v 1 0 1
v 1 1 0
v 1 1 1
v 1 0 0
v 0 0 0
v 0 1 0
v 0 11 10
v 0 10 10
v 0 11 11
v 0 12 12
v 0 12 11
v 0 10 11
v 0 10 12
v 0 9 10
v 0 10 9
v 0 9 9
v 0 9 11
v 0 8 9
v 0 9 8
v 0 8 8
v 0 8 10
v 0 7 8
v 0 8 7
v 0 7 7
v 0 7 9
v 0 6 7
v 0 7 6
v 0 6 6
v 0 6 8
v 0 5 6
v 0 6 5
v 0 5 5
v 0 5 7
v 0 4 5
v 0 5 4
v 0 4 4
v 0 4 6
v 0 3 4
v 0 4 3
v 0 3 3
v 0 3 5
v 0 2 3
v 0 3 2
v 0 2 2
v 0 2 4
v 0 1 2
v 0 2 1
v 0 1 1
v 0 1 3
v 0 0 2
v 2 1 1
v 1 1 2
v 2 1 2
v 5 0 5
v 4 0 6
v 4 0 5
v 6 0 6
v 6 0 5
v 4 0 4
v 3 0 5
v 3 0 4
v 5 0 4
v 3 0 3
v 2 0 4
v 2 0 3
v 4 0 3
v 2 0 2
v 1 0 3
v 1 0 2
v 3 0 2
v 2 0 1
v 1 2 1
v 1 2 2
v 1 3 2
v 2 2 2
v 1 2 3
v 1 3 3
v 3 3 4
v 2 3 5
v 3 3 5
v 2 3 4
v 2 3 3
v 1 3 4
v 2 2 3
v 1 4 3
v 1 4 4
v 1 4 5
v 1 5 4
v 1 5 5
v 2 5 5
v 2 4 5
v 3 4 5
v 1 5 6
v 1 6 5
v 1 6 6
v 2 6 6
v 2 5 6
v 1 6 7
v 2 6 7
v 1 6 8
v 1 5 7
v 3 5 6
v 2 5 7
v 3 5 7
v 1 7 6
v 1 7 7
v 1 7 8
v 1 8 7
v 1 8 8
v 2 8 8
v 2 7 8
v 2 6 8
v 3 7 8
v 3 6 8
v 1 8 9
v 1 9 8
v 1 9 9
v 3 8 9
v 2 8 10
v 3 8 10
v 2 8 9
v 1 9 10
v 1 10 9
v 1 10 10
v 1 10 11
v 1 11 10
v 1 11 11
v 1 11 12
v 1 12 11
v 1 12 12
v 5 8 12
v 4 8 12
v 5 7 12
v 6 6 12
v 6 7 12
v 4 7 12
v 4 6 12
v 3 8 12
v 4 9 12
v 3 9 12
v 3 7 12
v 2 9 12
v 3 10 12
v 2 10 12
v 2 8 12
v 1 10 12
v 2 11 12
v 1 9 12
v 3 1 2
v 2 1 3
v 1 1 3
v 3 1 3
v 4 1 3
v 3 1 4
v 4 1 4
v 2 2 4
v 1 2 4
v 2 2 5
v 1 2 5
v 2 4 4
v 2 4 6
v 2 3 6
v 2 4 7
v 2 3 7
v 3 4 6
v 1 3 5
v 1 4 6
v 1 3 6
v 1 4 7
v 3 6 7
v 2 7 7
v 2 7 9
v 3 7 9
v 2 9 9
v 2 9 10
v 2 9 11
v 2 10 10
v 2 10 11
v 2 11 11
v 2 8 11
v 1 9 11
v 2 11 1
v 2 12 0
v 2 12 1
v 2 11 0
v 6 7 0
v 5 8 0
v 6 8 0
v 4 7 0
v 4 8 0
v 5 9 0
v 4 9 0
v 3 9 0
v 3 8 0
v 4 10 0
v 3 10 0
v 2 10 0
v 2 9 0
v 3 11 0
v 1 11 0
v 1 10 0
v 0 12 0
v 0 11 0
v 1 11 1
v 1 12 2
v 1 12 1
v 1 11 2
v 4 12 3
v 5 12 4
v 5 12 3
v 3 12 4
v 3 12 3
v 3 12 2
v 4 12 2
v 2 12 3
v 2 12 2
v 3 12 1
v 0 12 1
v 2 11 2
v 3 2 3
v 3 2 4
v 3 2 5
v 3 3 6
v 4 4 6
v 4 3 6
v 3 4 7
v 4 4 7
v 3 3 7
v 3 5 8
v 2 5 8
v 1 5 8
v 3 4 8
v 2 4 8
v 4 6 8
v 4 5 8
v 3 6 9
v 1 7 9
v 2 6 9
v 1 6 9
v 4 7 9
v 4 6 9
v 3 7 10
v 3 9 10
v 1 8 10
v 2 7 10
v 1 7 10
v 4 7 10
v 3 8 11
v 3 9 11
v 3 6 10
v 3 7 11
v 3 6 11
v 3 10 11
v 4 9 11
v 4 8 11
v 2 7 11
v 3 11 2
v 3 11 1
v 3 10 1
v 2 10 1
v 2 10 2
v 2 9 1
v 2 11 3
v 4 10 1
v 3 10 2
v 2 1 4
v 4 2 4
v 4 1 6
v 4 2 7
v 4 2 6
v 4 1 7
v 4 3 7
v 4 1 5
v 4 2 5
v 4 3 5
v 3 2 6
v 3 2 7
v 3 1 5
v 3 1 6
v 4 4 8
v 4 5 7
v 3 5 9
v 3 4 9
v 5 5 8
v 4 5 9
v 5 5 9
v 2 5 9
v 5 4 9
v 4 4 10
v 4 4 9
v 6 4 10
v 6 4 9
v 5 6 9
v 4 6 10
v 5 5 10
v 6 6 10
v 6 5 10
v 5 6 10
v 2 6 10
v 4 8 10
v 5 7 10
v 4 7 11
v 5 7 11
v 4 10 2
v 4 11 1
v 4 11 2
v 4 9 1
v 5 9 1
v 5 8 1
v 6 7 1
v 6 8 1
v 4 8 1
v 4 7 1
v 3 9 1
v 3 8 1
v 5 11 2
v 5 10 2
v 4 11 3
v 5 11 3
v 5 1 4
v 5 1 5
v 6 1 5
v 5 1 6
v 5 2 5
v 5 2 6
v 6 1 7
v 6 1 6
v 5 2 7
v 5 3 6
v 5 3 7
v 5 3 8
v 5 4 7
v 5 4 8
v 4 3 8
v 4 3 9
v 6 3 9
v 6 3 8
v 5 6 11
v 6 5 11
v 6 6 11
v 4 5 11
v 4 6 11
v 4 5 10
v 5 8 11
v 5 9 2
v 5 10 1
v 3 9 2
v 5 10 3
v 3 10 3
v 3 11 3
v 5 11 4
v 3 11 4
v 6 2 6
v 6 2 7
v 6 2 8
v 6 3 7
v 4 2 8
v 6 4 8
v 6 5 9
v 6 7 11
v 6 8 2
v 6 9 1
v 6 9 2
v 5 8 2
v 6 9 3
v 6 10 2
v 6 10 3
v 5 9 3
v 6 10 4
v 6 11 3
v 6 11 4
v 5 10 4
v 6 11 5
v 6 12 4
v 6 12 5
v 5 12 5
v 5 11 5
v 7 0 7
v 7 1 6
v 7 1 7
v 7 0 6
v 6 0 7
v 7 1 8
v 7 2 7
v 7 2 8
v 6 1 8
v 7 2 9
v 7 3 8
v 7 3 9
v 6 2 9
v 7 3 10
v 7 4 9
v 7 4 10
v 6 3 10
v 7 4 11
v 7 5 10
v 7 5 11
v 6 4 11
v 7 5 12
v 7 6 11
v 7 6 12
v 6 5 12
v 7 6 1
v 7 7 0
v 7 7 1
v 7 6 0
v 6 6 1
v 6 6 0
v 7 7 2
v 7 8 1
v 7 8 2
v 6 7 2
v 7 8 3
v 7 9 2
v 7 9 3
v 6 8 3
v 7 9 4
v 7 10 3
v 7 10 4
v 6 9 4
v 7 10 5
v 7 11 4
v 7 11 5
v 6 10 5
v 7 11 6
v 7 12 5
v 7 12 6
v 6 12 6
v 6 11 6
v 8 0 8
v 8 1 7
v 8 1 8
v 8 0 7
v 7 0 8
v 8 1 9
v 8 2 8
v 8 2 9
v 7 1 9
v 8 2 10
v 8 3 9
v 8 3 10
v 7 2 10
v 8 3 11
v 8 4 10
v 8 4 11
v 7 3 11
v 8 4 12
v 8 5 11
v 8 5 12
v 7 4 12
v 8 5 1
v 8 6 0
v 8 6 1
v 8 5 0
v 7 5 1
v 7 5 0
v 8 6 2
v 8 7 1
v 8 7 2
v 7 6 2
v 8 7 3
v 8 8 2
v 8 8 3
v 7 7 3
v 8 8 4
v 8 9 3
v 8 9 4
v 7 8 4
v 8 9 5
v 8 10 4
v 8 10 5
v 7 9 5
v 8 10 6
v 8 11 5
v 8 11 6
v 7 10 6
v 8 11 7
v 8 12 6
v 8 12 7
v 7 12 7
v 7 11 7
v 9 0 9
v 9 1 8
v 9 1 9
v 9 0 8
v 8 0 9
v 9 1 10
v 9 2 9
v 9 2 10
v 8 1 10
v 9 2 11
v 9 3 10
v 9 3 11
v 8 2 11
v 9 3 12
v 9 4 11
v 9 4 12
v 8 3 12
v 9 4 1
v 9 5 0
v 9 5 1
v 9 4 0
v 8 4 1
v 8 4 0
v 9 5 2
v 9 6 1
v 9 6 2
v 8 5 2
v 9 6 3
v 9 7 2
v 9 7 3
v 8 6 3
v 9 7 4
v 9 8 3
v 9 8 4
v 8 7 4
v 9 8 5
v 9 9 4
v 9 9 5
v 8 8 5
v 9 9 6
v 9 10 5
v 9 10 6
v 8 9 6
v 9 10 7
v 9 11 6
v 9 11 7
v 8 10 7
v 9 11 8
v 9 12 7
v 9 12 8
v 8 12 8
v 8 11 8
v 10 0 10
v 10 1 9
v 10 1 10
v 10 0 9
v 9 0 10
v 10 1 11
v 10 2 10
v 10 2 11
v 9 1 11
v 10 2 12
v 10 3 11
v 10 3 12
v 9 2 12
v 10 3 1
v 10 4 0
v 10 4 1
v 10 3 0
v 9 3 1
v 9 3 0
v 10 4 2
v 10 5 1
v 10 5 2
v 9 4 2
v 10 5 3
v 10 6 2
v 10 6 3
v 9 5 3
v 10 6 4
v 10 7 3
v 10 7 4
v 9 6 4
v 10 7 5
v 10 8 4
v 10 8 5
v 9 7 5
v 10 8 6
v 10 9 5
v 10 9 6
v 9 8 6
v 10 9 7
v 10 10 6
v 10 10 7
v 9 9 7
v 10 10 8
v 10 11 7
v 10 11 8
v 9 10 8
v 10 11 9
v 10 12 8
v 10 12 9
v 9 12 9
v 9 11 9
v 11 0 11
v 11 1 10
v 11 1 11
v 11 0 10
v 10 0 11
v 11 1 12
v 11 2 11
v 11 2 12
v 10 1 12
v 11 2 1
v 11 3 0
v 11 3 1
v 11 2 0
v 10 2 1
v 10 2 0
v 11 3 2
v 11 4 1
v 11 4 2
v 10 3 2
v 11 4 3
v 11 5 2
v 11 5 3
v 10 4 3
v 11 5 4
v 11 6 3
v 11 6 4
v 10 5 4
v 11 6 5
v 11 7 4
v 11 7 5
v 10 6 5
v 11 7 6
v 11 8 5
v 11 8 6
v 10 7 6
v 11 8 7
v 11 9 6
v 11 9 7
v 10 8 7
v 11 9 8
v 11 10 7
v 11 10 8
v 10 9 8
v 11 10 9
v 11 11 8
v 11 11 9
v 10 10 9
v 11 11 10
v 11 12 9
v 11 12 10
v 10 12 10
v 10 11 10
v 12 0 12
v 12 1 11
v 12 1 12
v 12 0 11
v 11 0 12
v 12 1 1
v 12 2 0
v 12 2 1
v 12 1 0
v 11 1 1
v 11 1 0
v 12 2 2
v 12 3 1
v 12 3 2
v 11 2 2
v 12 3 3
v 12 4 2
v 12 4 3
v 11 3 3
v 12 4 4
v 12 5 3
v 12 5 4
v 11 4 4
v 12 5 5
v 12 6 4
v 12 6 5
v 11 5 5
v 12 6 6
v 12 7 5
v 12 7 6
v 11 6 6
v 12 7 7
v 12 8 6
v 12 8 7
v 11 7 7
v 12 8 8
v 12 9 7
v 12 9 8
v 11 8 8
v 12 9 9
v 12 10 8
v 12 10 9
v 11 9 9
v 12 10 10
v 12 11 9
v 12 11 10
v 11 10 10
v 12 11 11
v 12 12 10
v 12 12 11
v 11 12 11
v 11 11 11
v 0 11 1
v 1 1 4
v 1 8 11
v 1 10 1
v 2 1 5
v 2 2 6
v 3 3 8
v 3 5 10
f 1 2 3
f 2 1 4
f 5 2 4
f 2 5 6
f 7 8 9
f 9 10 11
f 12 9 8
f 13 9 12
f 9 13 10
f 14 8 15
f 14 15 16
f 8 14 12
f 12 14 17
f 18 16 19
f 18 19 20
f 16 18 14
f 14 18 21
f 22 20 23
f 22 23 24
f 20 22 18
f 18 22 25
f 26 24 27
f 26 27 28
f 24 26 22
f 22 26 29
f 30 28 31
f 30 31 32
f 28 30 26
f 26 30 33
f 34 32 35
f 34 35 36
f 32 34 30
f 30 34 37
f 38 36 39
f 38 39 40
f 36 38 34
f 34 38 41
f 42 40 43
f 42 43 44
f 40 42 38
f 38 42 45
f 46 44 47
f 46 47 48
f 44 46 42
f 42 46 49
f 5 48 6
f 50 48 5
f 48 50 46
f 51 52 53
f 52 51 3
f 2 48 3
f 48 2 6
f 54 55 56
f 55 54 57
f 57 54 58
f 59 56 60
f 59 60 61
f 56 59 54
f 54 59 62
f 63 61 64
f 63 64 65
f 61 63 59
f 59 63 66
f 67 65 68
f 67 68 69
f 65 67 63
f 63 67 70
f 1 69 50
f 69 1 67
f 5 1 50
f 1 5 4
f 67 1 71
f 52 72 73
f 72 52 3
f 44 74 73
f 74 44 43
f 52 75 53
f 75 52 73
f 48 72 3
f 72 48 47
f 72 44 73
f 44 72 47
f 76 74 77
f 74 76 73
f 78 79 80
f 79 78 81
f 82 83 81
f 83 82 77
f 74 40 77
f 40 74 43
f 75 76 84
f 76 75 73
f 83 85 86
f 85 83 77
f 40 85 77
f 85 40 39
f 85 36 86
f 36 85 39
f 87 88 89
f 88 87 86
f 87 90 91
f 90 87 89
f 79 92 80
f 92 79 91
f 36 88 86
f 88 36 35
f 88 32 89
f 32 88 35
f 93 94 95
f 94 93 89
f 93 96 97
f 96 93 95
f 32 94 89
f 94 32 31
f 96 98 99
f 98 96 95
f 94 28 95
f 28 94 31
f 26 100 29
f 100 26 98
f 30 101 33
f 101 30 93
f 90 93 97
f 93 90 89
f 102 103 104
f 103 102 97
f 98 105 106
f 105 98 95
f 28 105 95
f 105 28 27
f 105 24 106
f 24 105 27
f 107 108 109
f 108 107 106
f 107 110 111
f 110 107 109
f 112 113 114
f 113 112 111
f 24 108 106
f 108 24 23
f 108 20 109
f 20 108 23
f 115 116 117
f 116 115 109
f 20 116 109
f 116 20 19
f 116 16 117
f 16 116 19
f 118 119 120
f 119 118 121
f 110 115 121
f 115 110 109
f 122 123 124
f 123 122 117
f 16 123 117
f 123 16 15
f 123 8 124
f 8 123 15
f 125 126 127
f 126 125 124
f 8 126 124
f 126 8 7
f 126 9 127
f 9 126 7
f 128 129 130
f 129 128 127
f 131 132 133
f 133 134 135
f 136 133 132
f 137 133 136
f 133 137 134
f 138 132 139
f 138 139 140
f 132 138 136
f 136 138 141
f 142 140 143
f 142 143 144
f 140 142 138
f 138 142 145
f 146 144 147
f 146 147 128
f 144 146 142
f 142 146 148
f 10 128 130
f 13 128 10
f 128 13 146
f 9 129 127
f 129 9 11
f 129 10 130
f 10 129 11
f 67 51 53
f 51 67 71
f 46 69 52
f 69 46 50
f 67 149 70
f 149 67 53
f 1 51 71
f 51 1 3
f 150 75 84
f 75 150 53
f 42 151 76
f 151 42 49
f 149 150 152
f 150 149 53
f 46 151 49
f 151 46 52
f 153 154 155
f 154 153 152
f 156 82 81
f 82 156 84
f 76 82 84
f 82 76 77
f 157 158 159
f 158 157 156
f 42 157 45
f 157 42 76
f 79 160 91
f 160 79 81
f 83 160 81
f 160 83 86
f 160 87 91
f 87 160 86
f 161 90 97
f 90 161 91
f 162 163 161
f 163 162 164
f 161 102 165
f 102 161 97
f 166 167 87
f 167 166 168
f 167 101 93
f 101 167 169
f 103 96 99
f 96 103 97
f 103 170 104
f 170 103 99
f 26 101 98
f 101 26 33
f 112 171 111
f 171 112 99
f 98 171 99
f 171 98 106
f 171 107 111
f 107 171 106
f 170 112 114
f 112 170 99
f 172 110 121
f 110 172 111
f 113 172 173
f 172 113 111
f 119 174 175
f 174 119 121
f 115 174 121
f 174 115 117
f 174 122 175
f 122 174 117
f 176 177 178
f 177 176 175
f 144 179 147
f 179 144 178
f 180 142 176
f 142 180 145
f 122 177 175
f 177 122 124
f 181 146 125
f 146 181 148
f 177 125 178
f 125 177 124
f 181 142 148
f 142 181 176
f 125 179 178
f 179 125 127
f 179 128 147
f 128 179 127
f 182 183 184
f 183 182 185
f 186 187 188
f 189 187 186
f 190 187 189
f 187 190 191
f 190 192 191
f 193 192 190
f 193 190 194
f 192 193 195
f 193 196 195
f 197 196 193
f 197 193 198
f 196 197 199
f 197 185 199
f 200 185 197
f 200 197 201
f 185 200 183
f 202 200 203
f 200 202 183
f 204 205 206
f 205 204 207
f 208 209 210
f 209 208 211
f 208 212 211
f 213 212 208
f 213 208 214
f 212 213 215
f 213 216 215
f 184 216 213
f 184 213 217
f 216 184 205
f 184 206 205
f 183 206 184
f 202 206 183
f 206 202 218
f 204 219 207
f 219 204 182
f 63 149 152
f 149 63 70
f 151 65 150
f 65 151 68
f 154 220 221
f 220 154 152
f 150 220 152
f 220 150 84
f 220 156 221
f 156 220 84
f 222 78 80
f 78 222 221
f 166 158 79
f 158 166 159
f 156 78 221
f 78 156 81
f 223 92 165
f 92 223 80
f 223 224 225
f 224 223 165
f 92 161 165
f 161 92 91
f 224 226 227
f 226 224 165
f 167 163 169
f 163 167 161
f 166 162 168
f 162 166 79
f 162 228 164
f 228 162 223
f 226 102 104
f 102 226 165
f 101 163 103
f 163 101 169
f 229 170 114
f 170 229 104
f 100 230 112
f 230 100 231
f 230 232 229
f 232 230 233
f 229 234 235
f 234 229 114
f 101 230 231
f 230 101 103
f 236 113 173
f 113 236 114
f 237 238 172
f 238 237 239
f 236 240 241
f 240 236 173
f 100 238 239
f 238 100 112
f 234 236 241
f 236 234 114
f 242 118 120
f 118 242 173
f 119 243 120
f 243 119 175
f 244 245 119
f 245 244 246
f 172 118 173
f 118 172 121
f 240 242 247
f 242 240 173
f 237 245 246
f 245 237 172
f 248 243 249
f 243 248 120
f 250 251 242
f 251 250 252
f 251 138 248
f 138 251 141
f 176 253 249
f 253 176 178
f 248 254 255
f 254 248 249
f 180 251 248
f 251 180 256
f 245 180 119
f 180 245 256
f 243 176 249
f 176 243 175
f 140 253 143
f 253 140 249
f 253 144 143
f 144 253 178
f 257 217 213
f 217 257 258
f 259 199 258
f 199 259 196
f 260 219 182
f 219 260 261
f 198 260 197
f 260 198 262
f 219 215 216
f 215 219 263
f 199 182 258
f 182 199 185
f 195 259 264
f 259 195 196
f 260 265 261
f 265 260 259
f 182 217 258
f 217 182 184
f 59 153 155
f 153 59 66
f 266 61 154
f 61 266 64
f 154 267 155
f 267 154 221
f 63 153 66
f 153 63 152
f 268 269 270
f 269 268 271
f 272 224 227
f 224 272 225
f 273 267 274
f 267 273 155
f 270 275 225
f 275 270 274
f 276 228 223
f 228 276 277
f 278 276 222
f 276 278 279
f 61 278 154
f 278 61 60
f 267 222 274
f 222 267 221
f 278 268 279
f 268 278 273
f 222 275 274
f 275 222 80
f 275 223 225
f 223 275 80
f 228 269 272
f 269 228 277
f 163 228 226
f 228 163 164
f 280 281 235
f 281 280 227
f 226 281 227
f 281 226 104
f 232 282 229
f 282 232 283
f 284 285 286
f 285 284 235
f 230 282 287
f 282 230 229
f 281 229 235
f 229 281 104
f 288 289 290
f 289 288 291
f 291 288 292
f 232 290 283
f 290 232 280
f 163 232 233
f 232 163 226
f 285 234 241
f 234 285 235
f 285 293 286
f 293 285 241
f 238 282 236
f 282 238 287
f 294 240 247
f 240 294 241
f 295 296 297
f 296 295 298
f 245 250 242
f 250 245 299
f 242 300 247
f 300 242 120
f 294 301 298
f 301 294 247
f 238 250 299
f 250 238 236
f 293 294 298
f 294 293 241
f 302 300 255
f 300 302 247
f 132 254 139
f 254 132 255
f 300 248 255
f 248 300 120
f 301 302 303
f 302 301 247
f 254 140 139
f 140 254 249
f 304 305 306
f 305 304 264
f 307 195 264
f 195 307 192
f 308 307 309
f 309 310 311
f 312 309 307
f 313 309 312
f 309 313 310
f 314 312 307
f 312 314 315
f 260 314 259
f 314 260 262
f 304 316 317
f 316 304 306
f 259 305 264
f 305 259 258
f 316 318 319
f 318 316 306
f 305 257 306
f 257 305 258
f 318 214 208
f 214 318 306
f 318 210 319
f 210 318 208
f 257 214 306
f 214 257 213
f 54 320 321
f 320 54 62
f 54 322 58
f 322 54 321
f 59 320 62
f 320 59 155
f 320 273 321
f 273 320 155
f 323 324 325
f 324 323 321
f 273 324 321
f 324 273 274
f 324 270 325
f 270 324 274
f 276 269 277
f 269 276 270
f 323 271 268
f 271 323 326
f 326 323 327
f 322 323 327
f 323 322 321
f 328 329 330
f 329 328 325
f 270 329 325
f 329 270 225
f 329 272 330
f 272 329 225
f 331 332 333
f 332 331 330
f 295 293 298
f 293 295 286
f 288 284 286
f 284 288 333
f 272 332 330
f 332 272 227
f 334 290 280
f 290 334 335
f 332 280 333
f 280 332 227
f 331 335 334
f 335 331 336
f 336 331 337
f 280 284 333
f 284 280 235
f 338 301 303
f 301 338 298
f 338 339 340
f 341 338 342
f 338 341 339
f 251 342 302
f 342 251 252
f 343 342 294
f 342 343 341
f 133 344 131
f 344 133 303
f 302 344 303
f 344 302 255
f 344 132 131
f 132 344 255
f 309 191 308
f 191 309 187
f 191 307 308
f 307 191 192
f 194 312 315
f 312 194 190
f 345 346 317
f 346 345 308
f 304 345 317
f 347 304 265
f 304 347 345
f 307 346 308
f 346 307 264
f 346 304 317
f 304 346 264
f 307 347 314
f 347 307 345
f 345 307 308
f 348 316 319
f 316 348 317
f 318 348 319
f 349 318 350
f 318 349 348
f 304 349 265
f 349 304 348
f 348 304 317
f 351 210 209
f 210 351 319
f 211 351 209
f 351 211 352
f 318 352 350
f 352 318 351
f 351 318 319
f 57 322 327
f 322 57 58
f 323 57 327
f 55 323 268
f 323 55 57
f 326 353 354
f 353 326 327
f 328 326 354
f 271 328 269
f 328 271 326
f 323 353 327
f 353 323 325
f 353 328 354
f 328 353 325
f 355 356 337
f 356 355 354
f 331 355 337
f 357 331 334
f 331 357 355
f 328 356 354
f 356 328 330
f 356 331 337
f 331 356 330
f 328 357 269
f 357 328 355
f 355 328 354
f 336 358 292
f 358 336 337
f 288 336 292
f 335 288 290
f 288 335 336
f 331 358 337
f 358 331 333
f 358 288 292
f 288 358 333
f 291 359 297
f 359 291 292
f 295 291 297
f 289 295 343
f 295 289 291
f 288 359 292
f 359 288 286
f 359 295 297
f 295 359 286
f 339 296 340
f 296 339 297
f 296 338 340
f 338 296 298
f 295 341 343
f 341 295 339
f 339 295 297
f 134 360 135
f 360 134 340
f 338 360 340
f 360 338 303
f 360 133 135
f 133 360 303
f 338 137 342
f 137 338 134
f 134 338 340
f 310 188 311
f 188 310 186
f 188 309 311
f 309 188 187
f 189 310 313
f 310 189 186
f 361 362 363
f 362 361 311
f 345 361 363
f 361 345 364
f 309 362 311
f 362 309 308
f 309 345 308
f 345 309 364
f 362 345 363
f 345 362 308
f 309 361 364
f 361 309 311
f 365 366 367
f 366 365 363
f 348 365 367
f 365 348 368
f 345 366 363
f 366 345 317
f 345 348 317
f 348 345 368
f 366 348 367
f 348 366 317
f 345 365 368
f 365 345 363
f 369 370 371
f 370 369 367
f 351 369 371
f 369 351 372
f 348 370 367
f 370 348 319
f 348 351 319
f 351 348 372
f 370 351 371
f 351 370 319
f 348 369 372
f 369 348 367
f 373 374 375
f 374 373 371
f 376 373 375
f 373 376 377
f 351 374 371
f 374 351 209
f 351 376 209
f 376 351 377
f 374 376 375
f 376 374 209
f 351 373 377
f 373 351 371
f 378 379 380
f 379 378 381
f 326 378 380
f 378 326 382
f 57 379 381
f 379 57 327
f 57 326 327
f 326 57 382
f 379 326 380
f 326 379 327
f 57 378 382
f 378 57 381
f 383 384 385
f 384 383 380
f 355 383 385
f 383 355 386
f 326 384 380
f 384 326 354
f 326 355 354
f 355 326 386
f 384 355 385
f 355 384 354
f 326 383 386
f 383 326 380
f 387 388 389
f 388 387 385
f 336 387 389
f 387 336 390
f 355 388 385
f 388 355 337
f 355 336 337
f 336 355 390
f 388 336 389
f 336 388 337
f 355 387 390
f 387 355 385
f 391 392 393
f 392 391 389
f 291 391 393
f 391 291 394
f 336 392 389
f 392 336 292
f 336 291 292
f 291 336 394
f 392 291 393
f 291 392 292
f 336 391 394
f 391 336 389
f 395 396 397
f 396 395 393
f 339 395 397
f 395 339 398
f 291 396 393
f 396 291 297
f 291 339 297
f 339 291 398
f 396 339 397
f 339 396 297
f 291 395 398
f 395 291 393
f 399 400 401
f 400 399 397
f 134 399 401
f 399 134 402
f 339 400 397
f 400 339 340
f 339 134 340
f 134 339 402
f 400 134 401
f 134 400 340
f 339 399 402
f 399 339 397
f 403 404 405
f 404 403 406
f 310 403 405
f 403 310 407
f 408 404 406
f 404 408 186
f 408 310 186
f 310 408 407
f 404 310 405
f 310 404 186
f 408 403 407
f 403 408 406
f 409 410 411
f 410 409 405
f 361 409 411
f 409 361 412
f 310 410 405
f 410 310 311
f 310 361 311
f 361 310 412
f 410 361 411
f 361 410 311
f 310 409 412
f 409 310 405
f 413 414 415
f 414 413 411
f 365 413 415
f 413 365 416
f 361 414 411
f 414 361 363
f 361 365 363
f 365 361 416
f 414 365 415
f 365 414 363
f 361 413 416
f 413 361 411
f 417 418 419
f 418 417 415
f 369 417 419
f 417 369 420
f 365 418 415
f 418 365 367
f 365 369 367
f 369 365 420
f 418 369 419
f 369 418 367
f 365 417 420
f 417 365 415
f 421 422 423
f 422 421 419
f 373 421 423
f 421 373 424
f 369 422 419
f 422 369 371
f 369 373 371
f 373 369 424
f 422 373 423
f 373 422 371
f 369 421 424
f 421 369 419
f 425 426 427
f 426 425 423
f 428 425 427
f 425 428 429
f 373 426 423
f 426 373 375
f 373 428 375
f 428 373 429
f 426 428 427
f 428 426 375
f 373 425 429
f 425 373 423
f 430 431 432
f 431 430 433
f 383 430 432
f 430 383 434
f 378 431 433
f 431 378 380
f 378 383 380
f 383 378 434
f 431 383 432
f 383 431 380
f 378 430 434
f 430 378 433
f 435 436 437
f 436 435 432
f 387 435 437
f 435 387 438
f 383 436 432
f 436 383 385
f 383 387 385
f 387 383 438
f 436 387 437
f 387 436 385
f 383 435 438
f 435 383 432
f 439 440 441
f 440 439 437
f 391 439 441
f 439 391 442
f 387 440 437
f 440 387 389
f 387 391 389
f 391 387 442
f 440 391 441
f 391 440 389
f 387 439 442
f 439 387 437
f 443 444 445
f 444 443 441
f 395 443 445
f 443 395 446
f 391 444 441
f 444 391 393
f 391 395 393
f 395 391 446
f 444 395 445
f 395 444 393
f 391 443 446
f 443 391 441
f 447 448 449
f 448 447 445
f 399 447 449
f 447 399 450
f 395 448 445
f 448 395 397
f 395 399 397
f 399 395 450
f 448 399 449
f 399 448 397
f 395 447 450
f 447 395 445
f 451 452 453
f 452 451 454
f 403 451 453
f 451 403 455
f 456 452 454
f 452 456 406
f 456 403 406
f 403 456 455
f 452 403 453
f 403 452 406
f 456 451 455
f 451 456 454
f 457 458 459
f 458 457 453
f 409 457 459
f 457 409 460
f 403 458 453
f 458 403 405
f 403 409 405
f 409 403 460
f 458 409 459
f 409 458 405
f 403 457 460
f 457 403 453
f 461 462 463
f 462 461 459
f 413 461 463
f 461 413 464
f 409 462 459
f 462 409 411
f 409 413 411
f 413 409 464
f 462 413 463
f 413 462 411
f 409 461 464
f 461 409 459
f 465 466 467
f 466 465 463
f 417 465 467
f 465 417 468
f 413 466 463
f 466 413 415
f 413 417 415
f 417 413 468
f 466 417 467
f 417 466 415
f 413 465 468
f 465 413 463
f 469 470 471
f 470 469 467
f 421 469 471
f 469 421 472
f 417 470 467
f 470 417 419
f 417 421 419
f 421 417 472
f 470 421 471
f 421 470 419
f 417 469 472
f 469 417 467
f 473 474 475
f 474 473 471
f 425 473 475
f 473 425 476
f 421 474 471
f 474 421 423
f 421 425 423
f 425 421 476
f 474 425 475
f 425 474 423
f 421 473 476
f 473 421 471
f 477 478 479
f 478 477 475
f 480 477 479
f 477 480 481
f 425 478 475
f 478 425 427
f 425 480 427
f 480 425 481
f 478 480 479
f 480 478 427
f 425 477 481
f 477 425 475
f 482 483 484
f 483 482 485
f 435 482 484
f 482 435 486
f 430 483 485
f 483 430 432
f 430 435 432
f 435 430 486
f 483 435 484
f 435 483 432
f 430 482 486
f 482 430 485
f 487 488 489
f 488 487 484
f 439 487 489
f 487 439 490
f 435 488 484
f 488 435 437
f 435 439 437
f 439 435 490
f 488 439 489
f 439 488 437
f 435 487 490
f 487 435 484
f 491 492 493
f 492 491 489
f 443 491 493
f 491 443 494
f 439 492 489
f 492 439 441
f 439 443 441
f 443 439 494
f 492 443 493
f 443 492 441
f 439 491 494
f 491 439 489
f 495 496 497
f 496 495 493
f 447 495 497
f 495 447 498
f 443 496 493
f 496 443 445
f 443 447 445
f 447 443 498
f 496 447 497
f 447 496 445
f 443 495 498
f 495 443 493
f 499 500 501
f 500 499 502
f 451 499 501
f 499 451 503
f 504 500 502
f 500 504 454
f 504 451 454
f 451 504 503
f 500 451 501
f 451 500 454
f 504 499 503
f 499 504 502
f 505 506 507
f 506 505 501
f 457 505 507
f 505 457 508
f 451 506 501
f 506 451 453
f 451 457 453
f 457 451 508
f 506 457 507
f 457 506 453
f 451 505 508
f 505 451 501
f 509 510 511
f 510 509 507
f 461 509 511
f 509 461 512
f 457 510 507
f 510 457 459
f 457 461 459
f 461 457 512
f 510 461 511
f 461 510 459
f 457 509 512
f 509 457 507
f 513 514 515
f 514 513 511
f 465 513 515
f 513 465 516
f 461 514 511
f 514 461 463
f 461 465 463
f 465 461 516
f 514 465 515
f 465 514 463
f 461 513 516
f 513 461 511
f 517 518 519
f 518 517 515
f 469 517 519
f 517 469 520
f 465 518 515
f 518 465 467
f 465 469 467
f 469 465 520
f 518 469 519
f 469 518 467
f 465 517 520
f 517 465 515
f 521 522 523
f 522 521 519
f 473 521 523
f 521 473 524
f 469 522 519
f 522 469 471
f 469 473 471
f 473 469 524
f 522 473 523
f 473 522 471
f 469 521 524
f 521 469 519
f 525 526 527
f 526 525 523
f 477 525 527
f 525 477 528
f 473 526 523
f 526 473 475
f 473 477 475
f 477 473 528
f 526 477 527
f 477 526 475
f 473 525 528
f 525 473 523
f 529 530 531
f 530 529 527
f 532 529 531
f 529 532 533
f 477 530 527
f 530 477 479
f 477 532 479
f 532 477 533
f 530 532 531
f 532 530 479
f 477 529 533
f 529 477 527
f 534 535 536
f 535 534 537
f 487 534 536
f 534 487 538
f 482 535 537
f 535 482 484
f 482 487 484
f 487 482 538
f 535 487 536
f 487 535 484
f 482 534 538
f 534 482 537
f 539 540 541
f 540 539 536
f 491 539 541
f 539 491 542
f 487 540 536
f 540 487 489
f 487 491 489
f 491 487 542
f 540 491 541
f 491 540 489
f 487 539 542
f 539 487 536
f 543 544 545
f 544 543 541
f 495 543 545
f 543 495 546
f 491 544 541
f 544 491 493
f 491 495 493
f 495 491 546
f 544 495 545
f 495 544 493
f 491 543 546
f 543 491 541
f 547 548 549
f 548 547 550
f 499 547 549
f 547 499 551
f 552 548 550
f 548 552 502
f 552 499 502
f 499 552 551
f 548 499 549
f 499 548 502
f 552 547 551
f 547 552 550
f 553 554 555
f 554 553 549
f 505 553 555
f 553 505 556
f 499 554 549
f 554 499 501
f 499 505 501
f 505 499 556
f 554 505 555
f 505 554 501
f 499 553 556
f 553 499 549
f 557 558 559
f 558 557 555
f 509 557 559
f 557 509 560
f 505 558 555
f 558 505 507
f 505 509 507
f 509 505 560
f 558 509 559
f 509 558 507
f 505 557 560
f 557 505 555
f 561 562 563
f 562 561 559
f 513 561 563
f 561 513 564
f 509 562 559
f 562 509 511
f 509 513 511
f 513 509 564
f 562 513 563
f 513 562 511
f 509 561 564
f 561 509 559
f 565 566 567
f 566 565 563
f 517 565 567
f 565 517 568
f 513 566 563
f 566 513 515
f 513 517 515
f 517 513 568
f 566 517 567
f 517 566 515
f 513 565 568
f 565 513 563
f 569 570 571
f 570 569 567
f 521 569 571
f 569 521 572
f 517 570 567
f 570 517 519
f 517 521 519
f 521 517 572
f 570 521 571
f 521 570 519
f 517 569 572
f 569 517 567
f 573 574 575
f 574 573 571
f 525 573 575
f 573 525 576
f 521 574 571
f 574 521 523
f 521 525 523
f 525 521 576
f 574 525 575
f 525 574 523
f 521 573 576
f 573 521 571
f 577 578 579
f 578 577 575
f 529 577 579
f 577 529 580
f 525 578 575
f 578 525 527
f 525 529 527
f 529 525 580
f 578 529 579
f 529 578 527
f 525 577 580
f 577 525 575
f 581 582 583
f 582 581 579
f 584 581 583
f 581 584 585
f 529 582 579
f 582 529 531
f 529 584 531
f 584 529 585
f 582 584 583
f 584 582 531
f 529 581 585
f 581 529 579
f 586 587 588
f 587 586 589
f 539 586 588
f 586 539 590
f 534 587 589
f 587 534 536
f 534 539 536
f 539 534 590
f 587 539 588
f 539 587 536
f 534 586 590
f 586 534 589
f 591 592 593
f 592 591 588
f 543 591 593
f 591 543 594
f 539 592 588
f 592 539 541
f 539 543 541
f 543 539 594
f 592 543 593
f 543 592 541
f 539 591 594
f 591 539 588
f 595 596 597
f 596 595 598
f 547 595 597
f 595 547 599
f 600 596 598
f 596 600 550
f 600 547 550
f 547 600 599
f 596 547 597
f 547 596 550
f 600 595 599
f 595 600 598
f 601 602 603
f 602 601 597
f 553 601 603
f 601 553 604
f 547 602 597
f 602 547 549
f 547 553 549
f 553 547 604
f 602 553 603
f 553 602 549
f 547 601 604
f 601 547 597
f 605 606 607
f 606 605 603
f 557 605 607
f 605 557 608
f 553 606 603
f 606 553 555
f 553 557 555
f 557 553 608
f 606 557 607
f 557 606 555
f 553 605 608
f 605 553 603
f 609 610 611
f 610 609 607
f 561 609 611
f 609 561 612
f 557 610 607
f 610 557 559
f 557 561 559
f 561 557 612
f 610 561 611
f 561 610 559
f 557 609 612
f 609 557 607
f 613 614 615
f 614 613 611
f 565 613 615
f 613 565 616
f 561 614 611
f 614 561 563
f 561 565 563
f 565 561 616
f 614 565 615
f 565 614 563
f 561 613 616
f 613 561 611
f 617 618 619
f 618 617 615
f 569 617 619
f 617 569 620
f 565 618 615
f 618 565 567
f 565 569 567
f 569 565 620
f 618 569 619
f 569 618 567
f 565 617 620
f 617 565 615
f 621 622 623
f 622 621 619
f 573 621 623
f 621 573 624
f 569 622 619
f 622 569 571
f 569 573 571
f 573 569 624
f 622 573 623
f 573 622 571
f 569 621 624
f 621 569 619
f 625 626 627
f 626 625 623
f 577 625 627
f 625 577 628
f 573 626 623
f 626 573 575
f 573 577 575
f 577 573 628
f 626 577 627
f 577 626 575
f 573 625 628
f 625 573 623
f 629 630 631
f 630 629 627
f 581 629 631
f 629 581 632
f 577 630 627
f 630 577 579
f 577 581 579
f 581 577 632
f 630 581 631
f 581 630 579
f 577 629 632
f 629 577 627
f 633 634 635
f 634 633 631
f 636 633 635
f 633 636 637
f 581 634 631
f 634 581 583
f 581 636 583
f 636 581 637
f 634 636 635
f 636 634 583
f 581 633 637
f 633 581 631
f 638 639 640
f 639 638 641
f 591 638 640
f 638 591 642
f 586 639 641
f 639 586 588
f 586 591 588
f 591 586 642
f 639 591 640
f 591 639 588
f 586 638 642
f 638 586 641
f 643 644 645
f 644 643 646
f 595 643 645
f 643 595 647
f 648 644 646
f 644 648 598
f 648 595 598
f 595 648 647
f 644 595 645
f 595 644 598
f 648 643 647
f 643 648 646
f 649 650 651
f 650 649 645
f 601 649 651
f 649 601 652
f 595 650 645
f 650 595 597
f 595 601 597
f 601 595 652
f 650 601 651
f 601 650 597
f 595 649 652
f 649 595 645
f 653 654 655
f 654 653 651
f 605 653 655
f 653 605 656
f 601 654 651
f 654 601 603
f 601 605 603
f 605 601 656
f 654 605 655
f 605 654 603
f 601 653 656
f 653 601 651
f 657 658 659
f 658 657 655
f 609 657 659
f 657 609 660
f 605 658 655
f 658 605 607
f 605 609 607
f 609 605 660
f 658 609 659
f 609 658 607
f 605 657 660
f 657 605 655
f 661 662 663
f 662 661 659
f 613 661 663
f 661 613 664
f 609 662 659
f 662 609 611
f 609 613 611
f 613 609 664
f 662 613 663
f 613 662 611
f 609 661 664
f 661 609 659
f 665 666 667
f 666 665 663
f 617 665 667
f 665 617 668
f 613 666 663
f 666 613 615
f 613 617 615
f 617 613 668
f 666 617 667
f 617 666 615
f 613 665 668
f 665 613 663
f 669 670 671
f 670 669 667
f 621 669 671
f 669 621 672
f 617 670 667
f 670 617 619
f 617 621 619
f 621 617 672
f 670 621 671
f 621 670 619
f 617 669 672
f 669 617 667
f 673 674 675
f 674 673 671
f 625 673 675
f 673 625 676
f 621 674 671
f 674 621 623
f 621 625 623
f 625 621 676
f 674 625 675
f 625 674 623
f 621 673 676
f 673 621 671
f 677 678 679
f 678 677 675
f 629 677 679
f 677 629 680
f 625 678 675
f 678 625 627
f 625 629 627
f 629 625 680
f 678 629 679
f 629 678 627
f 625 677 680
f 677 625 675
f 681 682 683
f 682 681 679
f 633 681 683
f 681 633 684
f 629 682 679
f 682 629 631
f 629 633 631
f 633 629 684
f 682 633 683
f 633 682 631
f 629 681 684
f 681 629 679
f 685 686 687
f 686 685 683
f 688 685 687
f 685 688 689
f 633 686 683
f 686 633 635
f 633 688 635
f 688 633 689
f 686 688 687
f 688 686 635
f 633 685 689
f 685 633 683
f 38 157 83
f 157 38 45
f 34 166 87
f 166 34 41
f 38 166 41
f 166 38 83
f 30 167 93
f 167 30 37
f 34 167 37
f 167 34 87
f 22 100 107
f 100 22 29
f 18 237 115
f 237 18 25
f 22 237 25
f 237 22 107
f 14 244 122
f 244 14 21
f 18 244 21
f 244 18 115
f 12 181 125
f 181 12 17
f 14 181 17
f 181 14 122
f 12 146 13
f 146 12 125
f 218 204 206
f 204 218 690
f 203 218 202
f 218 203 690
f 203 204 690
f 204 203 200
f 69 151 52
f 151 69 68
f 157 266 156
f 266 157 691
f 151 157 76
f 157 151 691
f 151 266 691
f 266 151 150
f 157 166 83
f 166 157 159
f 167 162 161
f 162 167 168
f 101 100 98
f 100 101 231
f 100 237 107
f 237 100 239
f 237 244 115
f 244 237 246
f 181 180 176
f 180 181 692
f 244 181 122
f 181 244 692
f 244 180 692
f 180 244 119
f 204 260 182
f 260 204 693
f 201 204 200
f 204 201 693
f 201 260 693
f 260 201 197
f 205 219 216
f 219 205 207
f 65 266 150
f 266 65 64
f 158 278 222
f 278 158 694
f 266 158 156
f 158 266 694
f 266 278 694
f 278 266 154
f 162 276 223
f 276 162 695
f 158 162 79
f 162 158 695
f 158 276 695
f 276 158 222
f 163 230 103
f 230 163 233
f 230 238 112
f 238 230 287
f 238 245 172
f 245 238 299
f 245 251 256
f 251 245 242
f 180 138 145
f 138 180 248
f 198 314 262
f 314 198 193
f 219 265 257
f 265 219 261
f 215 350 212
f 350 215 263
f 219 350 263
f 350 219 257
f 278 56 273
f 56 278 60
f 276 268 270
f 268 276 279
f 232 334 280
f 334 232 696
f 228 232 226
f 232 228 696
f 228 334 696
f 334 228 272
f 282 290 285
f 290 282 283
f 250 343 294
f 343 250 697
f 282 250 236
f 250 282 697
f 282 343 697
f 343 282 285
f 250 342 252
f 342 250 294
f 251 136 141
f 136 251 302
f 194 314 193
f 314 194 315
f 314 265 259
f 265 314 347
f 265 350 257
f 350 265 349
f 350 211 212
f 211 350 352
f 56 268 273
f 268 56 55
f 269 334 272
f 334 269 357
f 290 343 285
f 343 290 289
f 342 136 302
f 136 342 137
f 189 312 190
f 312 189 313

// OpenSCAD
union() {
    translate([0, 0, 0]) cube([1, 1, 1]);
    translate([0, 1, 1]) cube([1, 1, 1]);
    translate([0, 2, 2]) cube([1, 1, 1]);
    translate([0, 3, 3]) cube([1, 1, 1]);
    translate([0, 4, 4]) cube([1, 1, 1]);
    translate([0, 5, 5]) cube([1, 1, 1]);
    translate([0, 6, 6]) cube([1, 1, 1]);
    translate([0, 7, 7]) cube([1, 1, 1]);
    translate([0, 8, 8]) cube([1, 1, 1]);
    translate([0, 9, 9]) cube([1, 1, 1]);
    translate([0, 10, 10]) cube([1, 1, 1]);
    translate([0, 11, 11]) cube([1, 1, 1]);
    translate([1, 0, 1]) cube([1, 1, 1]);
    translate([1, 1, 2]) cube([1, 1, 1]);
    translate([1, 2, 3]) cube([1, 1, 1]);
    translate([1, 3, 4]) cube([1, 1, 1]);
    translate([1, 4, 5]) cube([1, 1, 1]);
    translate([1, 5, 6]) cube([1, 1, 1]);
    translate([1, 6, 7]) cube([1, 1, 1]);
    translate([1, 7, 8]) cube([1, 1, 1]);
    translate([1, 8, 9]) cube([1, 1, 1]);
    translate([1, 9, 10]) cube([1, 1, 1]);
    translate([1, 10, 11]) cube([1, 1, 1]);
    translate([1, 11, 0]) cube([1, 1, 1]);
    translate([2, 0, 2]) cube([1, 1, 1]);
    translate([2, 1, 3]) cube([1, 1, 1]);
    translate([2, 2, 4]) cube([1, 1, 1]);
    translate([2, 3, 5]) cube([1, 1, 1]);
    translate([2, 4, 6]) cube([1, 1, 1]);
    translate([2, 5, 7]) cube([1, 1, 1]);
    translate([2, 6, 8]) cube([1, 1, 1]);
    translate([2, 7, 9]) cube([1, 1, 1]);
    translate([2, 8, 10]) cube([1, 1, 1]);
    translate([2, 9, 11]) cube([1, 1, 1]);
    translate([2, 10, 0]) cube([1, 1, 1]);
    translate([2, 11, 1]) cube([1, 1, 1]);
    translate([3, 0, 3]) cube([1, 1, 1]);
    translate([3, 1, 4]) cube([1, 1, 1]);
    translate([3, 2, 5]) cube([1, 1, 1]);
    translate([3, 3, 6]) cube([1, 1, 1]);
    translate([3, 4, 7]) cube([1, 1, 1]);
    translate([3, 5, 8]) cube([1, 1, 1]);
    translate([3, 6, 9]) cube([1, 1, 1]);
    translate([3, 7, 10]) cube([1, 1, 1]);
    translate([3, 8, 11]) cube([1, 1, 1]);
    translate([3, 9, 0]) cube([1, 1, 1]);
    translate([3, 10, 1]) cube([1, 1, 1]);
    translate([3, 11, 2]) cube([1, 1, 1]);
    translate([4, 0, 4]) cube([1, 1, 1]);
    translate([4, 1, 5]) cube([1, 1, 1]);
    translate([4, 2, 6]) cube([1, 1, 1]);
    translate([4, 3, 7]) cube([1, 1, 1]);
    translate([4, 4, 8]) cube([1, 1, 1]);
    translate([4, 5, 9]) cube([1, 1, 1]);
    translate([4, 6, 10]) cube([1, 1, 1]);
    translate([4, 7, 11]) cube([1, 1, 1]);
    translate([4, 8, 0]) cube([1, 1, 1]);
    translate([4, 9, 1]) cube([1, 1, 1]);
    translate([4, 10, 2]) cube([1, 1, 1]);
    translate([4, 11, 3]) cube([1, 1, 1]);
    translate([5, 0, 5]) cube([1, 1, 1]);
    translate([5, 1, 6]) cube([1, 1, 1]);
    translate([5, 2, 7]) cube([1, 1, 1]);
    translate([5, 3, 8]) cube([1, 1, 1]);
    translate([5, 4, 9]) cube([1, 1, 1]);
    translate([5, 5, 10]) cube([1, 1, 1]);
    translate([5, 6, 11]) cube([1, 1, 1]);
    translate([5, 7, 0]) cube([1, 1, 1]);
    translate([5, 8, 1]) cube([1, 1, 1]);
    translate([5, 9, 2]) cube([1, 1, 1]);
    translate([5, 10, 3]) cube([1, 1, 1]);
    translate([5, 11, 4]) cube([1, 1, 1]);
    translate([6, 0, 6]) cube([1, 1, 1]);
    translate([6, 1, 7]) cube([1, 1, 1]);
    translate([6, 2, 8]) cube([1, 1, 1]);
    translate([6, 3, 9]) cube([1, 1, 1]);
    translate([6, 4, 10]) cube([1, 1, 1]);
    translate([6, 5, 11]) cube([1, 1, 1]);
    translate([6, 6, 0]) cube([1, 1, 1]);
    translate([6, 7, 1]) cube([1, 1, 1]);
    translate([6, 8, 2]) cube([1, 1, 1]);
    translate([6, 9, 3]) cube([1, 1, 1]);
    translate([6, 10, 4]) cube([1, 1, 1]);
    translate([6, 11, 5]) cube([1, 1, 1]);
    translate([7, 0, 7]) cube([1, 1, 1]);
    translate([7, 1, 8]) cube([1, 1, 1]);
    translate([7, 2, 9]) cube([1, 1, 1]);
    translate([7, 3, 10]) cube([1, 1, 1]);
    translate([7, 4, 11]) cube([1, 1, 1]);
    translate([7, 5, 0]) cube([1, 1, 1]);
    translate([7, 6, 1]) cube([1, 1, 1]);
    translate([7, 7, 2]) cube([1, 1, 1]);
    translate([7, 8, 3]) cube([1, 1, 1]);
    translate([7, 9, 4]) cube([1, 1, 1]);
    translate([7, 10, 5]) cube([1, 1, 1]);
    translate([7, 11, 6]) cube([1, 1, 1]);
    translate([8, 0, 8]) cube([1, 1, 1]);
    translate([8, 1, 9]) cube([1, 1, 1]);
    translate([8, 2, 10]) cube([1, 1, 1]);
    translate([8, 3, 11]) cube([1, 1, 1]);
    translate([8, 4, 0]) cube([1, 1, 1]);
    translate([8, 5, 1]) cube([1, 1, 1]);
    translate([8, 6, 2]) cube([1, 1, 1]);
    translate([8, 7, 3]) cube([1, 1, 1]);
    translate([8, 8, 4]) cube([1, 1, 1]);
    translate([8, 9, 5]) cube([1, 1, 1]);
    translate([8, 10, 6]) cube([1, 1, 1]);
    translate([8, 11, 7]) cube([1, 1, 1]);
    translate([9, 0, 9]) cube([1, 1, 1]);
    translate([9, 1, 10]) cube([1, 1, 1]);
    translate([9, 2, 11]) cube([1, 1, 1]);
    translate([9, 3, 0]) cube([1, 1, 1]);
    translate([9, 4, 1]) cube([1, 1, 1]);
    translate([9, 5, 2]) cube([1, 1, 1]);
    translate([9, 6, 3]) cube([1, 1, 1]);
    translate([9, 7, 4]) cube([1, 1, 1]);
    translate([9, 8, 5]) cube([1, 1, 1]);
    translate([9, 9, 6]) cube([1, 1, 1]);
    translate([9, 10, 7]) cube([1, 1, 1]);
    translate([9, 11, 8]) cube([1, 1, 1]);
    translate([10, 0, 10]) cube([1, 1, 1]);
    translate([10, 1, 11]) cube([1, 1, 1]);
    translate([10, 2, 0]) cube([1, 1, 1]);
    translate([10, 3, 1]) cube([1, 1, 1]);
    translate([10, 4, 2]) cube([1, 1, 1]);
    translate([10, 5, 3]) cube([1, 1, 1]);
    translate([10, 6, 4]) cube([1, 1, 1]);
    translate([10, 7, 5]) cube([1, 1, 1]);
    translate([10, 8, 6]) cube([1, 1, 1]);
    translate([10, 9, 7]) cube([1, 1, 1]);
    translate([10, 10, 8]) cube([1, 1, 1]);
    translate([10, 11, 9]) cube([1, 1, 1]);
    translate([11, 0, 11]) cube([1, 1, 1]);
    translate([11, 1, 0]) cube([1, 1, 1]);
    translate([11, 2, 1]) cube([1, 1, 1]);
    translate([11, 3, 2]) cube([1, 1, 1]);
    translate([11, 4, 3]) cube([1, 1, 1]);
    translate([11, 5, 4]) cube([1, 1, 1]);
    translate([11, 6, 5]) cube([1, 1, 1]);
    translate([11, 7, 6]) cube([1, 1, 1]);
    translate([11, 8, 7]) cube([1, 1, 1]);
    translate([11, 9, 8]) cube([1, 1, 1]);
    translate([11, 10, 9]) cube([1, 1, 1]);
    translate([11, 11, 10]) cube([1, 1, 1]);
    translate([0, 0, 1]) cube([1, 1, 1]);
    translate([0, 1, 2]) cube([1, 1, 1]);
    translate([0, 2, 3]) cube([1, 1, 1]);
    translate([0, 3, 4]) cube([1, 1, 1]);
    translate([0, 4, 5]) cube([1, 1, 1]);
    translate([0, 5, 6]) cube([1, 1, 1]);
    translate([0, 6, 7]) cube([1, 1, 1]);
    translate([0, 7, 8]) cube([1, 1, 1]);
    translate([0, 8, 9]) cube([1, 1, 1]);
    translate([0, 9, 10]) cube([1, 1, 1]);
    translate([0, 10, 11]) cube([1, 1, 1]);
    translate([0, 11, 0]) cube([1, 1, 1]);
    translate([1, 0, 2]) cube([1, 1, 1]);
    translate([1, 1, 3]) cube([1, 1, 1]);
    translate([1, 2, 4]) cube([1, 1, 1]);
    translate([1, 3, 5]) cube([1, 1, 1]);
    translate([1, 4, 6]) cube([1, 1, 1]);
    translate([1, 5, 7]) cube([1, 1, 1]);
    translate([1, 6, 8]) cube([1, 1, 1]);
    translate([1, 7, 9]) cube([1, 1, 1]);
    translate([1, 8, 10]) cube([1, 1, 1]);
    translate([1, 9, 11]) cube([1, 1, 1]);
    translate([1, 10, 0]) cube([1, 1, 1]);
    translate([1, 11, 1]) cube([1, 1, 1]);
    translate([2, 0, 3]) cube([1, 1, 1]);
    translate([2, 1, 4]) cube([1, 1, 1]);
    translate([2, 2, 5]) cube([1, 1, 1]);
    translate([2, 3, 6]) cube([1, 1, 1]);
    translate([2, 4, 7]) cube([1, 1, 1]);
    translate([2, 5, 8]) cube([1, 1, 1]);
    translate([2, 6, 9]) cube([1, 1, 1]);
    translate([2, 7, 10]) cube([1, 1, 1]);
    translate([2, 8, 11]) cube([1, 1, 1]);
    translate([2, 9, 0]) cube([1, 1, 1]);
    translate([2, 10, 1]) cube([1, 1, 1]);
    translate([2, 11, 2]) cube([1, 1, 1]);
    translate([3, 0, 4]) cube([1, 1, 1]);
    translate([3, 1, 5]) cube([1, 1, 1]);
    translate([3, 2, 6]) cube([1, 1, 1]);
    translate([3, 3, 7]) cube([1, 1, 1]);
    translate([3, 4, 8]) cube([1, 1, 1]);
    translate([3, 5, 9]) cube([1, 1, 1]);
    translate([3, 6, 10]) cube([1, 1, 1]);
    translate([3, 7, 11]) cube([1, 1, 1]);
    translate([3, 8, 0]) cube([1, 1, 1]);
    translate([3, 9, 1]) cube([1, 1, 1]);
    translate([3, 10, 2]) cube([1, 1, 1]);
    translate([3, 11, 3]) cube([1, 1, 1]);
    translate([4, 0, 5]) cube([1, 1, 1]);
    translate([4, 1, 6]) cube([1, 1, 1]);
    translate([4, 2, 7]) cube([1, 1, 1]);
    translate([4, 3, 8]) cube([1, 1, 1]);
    translate([4, 4, 9]) cube([1, 1, 1]);
    translate([4, 5, 10]) cube([1, 1, 1]);
    translate([4, 6, 11]) cube([1, 1, 1]);
    translate([4, 7, 0]) cube([1, 1, 1]);
}
